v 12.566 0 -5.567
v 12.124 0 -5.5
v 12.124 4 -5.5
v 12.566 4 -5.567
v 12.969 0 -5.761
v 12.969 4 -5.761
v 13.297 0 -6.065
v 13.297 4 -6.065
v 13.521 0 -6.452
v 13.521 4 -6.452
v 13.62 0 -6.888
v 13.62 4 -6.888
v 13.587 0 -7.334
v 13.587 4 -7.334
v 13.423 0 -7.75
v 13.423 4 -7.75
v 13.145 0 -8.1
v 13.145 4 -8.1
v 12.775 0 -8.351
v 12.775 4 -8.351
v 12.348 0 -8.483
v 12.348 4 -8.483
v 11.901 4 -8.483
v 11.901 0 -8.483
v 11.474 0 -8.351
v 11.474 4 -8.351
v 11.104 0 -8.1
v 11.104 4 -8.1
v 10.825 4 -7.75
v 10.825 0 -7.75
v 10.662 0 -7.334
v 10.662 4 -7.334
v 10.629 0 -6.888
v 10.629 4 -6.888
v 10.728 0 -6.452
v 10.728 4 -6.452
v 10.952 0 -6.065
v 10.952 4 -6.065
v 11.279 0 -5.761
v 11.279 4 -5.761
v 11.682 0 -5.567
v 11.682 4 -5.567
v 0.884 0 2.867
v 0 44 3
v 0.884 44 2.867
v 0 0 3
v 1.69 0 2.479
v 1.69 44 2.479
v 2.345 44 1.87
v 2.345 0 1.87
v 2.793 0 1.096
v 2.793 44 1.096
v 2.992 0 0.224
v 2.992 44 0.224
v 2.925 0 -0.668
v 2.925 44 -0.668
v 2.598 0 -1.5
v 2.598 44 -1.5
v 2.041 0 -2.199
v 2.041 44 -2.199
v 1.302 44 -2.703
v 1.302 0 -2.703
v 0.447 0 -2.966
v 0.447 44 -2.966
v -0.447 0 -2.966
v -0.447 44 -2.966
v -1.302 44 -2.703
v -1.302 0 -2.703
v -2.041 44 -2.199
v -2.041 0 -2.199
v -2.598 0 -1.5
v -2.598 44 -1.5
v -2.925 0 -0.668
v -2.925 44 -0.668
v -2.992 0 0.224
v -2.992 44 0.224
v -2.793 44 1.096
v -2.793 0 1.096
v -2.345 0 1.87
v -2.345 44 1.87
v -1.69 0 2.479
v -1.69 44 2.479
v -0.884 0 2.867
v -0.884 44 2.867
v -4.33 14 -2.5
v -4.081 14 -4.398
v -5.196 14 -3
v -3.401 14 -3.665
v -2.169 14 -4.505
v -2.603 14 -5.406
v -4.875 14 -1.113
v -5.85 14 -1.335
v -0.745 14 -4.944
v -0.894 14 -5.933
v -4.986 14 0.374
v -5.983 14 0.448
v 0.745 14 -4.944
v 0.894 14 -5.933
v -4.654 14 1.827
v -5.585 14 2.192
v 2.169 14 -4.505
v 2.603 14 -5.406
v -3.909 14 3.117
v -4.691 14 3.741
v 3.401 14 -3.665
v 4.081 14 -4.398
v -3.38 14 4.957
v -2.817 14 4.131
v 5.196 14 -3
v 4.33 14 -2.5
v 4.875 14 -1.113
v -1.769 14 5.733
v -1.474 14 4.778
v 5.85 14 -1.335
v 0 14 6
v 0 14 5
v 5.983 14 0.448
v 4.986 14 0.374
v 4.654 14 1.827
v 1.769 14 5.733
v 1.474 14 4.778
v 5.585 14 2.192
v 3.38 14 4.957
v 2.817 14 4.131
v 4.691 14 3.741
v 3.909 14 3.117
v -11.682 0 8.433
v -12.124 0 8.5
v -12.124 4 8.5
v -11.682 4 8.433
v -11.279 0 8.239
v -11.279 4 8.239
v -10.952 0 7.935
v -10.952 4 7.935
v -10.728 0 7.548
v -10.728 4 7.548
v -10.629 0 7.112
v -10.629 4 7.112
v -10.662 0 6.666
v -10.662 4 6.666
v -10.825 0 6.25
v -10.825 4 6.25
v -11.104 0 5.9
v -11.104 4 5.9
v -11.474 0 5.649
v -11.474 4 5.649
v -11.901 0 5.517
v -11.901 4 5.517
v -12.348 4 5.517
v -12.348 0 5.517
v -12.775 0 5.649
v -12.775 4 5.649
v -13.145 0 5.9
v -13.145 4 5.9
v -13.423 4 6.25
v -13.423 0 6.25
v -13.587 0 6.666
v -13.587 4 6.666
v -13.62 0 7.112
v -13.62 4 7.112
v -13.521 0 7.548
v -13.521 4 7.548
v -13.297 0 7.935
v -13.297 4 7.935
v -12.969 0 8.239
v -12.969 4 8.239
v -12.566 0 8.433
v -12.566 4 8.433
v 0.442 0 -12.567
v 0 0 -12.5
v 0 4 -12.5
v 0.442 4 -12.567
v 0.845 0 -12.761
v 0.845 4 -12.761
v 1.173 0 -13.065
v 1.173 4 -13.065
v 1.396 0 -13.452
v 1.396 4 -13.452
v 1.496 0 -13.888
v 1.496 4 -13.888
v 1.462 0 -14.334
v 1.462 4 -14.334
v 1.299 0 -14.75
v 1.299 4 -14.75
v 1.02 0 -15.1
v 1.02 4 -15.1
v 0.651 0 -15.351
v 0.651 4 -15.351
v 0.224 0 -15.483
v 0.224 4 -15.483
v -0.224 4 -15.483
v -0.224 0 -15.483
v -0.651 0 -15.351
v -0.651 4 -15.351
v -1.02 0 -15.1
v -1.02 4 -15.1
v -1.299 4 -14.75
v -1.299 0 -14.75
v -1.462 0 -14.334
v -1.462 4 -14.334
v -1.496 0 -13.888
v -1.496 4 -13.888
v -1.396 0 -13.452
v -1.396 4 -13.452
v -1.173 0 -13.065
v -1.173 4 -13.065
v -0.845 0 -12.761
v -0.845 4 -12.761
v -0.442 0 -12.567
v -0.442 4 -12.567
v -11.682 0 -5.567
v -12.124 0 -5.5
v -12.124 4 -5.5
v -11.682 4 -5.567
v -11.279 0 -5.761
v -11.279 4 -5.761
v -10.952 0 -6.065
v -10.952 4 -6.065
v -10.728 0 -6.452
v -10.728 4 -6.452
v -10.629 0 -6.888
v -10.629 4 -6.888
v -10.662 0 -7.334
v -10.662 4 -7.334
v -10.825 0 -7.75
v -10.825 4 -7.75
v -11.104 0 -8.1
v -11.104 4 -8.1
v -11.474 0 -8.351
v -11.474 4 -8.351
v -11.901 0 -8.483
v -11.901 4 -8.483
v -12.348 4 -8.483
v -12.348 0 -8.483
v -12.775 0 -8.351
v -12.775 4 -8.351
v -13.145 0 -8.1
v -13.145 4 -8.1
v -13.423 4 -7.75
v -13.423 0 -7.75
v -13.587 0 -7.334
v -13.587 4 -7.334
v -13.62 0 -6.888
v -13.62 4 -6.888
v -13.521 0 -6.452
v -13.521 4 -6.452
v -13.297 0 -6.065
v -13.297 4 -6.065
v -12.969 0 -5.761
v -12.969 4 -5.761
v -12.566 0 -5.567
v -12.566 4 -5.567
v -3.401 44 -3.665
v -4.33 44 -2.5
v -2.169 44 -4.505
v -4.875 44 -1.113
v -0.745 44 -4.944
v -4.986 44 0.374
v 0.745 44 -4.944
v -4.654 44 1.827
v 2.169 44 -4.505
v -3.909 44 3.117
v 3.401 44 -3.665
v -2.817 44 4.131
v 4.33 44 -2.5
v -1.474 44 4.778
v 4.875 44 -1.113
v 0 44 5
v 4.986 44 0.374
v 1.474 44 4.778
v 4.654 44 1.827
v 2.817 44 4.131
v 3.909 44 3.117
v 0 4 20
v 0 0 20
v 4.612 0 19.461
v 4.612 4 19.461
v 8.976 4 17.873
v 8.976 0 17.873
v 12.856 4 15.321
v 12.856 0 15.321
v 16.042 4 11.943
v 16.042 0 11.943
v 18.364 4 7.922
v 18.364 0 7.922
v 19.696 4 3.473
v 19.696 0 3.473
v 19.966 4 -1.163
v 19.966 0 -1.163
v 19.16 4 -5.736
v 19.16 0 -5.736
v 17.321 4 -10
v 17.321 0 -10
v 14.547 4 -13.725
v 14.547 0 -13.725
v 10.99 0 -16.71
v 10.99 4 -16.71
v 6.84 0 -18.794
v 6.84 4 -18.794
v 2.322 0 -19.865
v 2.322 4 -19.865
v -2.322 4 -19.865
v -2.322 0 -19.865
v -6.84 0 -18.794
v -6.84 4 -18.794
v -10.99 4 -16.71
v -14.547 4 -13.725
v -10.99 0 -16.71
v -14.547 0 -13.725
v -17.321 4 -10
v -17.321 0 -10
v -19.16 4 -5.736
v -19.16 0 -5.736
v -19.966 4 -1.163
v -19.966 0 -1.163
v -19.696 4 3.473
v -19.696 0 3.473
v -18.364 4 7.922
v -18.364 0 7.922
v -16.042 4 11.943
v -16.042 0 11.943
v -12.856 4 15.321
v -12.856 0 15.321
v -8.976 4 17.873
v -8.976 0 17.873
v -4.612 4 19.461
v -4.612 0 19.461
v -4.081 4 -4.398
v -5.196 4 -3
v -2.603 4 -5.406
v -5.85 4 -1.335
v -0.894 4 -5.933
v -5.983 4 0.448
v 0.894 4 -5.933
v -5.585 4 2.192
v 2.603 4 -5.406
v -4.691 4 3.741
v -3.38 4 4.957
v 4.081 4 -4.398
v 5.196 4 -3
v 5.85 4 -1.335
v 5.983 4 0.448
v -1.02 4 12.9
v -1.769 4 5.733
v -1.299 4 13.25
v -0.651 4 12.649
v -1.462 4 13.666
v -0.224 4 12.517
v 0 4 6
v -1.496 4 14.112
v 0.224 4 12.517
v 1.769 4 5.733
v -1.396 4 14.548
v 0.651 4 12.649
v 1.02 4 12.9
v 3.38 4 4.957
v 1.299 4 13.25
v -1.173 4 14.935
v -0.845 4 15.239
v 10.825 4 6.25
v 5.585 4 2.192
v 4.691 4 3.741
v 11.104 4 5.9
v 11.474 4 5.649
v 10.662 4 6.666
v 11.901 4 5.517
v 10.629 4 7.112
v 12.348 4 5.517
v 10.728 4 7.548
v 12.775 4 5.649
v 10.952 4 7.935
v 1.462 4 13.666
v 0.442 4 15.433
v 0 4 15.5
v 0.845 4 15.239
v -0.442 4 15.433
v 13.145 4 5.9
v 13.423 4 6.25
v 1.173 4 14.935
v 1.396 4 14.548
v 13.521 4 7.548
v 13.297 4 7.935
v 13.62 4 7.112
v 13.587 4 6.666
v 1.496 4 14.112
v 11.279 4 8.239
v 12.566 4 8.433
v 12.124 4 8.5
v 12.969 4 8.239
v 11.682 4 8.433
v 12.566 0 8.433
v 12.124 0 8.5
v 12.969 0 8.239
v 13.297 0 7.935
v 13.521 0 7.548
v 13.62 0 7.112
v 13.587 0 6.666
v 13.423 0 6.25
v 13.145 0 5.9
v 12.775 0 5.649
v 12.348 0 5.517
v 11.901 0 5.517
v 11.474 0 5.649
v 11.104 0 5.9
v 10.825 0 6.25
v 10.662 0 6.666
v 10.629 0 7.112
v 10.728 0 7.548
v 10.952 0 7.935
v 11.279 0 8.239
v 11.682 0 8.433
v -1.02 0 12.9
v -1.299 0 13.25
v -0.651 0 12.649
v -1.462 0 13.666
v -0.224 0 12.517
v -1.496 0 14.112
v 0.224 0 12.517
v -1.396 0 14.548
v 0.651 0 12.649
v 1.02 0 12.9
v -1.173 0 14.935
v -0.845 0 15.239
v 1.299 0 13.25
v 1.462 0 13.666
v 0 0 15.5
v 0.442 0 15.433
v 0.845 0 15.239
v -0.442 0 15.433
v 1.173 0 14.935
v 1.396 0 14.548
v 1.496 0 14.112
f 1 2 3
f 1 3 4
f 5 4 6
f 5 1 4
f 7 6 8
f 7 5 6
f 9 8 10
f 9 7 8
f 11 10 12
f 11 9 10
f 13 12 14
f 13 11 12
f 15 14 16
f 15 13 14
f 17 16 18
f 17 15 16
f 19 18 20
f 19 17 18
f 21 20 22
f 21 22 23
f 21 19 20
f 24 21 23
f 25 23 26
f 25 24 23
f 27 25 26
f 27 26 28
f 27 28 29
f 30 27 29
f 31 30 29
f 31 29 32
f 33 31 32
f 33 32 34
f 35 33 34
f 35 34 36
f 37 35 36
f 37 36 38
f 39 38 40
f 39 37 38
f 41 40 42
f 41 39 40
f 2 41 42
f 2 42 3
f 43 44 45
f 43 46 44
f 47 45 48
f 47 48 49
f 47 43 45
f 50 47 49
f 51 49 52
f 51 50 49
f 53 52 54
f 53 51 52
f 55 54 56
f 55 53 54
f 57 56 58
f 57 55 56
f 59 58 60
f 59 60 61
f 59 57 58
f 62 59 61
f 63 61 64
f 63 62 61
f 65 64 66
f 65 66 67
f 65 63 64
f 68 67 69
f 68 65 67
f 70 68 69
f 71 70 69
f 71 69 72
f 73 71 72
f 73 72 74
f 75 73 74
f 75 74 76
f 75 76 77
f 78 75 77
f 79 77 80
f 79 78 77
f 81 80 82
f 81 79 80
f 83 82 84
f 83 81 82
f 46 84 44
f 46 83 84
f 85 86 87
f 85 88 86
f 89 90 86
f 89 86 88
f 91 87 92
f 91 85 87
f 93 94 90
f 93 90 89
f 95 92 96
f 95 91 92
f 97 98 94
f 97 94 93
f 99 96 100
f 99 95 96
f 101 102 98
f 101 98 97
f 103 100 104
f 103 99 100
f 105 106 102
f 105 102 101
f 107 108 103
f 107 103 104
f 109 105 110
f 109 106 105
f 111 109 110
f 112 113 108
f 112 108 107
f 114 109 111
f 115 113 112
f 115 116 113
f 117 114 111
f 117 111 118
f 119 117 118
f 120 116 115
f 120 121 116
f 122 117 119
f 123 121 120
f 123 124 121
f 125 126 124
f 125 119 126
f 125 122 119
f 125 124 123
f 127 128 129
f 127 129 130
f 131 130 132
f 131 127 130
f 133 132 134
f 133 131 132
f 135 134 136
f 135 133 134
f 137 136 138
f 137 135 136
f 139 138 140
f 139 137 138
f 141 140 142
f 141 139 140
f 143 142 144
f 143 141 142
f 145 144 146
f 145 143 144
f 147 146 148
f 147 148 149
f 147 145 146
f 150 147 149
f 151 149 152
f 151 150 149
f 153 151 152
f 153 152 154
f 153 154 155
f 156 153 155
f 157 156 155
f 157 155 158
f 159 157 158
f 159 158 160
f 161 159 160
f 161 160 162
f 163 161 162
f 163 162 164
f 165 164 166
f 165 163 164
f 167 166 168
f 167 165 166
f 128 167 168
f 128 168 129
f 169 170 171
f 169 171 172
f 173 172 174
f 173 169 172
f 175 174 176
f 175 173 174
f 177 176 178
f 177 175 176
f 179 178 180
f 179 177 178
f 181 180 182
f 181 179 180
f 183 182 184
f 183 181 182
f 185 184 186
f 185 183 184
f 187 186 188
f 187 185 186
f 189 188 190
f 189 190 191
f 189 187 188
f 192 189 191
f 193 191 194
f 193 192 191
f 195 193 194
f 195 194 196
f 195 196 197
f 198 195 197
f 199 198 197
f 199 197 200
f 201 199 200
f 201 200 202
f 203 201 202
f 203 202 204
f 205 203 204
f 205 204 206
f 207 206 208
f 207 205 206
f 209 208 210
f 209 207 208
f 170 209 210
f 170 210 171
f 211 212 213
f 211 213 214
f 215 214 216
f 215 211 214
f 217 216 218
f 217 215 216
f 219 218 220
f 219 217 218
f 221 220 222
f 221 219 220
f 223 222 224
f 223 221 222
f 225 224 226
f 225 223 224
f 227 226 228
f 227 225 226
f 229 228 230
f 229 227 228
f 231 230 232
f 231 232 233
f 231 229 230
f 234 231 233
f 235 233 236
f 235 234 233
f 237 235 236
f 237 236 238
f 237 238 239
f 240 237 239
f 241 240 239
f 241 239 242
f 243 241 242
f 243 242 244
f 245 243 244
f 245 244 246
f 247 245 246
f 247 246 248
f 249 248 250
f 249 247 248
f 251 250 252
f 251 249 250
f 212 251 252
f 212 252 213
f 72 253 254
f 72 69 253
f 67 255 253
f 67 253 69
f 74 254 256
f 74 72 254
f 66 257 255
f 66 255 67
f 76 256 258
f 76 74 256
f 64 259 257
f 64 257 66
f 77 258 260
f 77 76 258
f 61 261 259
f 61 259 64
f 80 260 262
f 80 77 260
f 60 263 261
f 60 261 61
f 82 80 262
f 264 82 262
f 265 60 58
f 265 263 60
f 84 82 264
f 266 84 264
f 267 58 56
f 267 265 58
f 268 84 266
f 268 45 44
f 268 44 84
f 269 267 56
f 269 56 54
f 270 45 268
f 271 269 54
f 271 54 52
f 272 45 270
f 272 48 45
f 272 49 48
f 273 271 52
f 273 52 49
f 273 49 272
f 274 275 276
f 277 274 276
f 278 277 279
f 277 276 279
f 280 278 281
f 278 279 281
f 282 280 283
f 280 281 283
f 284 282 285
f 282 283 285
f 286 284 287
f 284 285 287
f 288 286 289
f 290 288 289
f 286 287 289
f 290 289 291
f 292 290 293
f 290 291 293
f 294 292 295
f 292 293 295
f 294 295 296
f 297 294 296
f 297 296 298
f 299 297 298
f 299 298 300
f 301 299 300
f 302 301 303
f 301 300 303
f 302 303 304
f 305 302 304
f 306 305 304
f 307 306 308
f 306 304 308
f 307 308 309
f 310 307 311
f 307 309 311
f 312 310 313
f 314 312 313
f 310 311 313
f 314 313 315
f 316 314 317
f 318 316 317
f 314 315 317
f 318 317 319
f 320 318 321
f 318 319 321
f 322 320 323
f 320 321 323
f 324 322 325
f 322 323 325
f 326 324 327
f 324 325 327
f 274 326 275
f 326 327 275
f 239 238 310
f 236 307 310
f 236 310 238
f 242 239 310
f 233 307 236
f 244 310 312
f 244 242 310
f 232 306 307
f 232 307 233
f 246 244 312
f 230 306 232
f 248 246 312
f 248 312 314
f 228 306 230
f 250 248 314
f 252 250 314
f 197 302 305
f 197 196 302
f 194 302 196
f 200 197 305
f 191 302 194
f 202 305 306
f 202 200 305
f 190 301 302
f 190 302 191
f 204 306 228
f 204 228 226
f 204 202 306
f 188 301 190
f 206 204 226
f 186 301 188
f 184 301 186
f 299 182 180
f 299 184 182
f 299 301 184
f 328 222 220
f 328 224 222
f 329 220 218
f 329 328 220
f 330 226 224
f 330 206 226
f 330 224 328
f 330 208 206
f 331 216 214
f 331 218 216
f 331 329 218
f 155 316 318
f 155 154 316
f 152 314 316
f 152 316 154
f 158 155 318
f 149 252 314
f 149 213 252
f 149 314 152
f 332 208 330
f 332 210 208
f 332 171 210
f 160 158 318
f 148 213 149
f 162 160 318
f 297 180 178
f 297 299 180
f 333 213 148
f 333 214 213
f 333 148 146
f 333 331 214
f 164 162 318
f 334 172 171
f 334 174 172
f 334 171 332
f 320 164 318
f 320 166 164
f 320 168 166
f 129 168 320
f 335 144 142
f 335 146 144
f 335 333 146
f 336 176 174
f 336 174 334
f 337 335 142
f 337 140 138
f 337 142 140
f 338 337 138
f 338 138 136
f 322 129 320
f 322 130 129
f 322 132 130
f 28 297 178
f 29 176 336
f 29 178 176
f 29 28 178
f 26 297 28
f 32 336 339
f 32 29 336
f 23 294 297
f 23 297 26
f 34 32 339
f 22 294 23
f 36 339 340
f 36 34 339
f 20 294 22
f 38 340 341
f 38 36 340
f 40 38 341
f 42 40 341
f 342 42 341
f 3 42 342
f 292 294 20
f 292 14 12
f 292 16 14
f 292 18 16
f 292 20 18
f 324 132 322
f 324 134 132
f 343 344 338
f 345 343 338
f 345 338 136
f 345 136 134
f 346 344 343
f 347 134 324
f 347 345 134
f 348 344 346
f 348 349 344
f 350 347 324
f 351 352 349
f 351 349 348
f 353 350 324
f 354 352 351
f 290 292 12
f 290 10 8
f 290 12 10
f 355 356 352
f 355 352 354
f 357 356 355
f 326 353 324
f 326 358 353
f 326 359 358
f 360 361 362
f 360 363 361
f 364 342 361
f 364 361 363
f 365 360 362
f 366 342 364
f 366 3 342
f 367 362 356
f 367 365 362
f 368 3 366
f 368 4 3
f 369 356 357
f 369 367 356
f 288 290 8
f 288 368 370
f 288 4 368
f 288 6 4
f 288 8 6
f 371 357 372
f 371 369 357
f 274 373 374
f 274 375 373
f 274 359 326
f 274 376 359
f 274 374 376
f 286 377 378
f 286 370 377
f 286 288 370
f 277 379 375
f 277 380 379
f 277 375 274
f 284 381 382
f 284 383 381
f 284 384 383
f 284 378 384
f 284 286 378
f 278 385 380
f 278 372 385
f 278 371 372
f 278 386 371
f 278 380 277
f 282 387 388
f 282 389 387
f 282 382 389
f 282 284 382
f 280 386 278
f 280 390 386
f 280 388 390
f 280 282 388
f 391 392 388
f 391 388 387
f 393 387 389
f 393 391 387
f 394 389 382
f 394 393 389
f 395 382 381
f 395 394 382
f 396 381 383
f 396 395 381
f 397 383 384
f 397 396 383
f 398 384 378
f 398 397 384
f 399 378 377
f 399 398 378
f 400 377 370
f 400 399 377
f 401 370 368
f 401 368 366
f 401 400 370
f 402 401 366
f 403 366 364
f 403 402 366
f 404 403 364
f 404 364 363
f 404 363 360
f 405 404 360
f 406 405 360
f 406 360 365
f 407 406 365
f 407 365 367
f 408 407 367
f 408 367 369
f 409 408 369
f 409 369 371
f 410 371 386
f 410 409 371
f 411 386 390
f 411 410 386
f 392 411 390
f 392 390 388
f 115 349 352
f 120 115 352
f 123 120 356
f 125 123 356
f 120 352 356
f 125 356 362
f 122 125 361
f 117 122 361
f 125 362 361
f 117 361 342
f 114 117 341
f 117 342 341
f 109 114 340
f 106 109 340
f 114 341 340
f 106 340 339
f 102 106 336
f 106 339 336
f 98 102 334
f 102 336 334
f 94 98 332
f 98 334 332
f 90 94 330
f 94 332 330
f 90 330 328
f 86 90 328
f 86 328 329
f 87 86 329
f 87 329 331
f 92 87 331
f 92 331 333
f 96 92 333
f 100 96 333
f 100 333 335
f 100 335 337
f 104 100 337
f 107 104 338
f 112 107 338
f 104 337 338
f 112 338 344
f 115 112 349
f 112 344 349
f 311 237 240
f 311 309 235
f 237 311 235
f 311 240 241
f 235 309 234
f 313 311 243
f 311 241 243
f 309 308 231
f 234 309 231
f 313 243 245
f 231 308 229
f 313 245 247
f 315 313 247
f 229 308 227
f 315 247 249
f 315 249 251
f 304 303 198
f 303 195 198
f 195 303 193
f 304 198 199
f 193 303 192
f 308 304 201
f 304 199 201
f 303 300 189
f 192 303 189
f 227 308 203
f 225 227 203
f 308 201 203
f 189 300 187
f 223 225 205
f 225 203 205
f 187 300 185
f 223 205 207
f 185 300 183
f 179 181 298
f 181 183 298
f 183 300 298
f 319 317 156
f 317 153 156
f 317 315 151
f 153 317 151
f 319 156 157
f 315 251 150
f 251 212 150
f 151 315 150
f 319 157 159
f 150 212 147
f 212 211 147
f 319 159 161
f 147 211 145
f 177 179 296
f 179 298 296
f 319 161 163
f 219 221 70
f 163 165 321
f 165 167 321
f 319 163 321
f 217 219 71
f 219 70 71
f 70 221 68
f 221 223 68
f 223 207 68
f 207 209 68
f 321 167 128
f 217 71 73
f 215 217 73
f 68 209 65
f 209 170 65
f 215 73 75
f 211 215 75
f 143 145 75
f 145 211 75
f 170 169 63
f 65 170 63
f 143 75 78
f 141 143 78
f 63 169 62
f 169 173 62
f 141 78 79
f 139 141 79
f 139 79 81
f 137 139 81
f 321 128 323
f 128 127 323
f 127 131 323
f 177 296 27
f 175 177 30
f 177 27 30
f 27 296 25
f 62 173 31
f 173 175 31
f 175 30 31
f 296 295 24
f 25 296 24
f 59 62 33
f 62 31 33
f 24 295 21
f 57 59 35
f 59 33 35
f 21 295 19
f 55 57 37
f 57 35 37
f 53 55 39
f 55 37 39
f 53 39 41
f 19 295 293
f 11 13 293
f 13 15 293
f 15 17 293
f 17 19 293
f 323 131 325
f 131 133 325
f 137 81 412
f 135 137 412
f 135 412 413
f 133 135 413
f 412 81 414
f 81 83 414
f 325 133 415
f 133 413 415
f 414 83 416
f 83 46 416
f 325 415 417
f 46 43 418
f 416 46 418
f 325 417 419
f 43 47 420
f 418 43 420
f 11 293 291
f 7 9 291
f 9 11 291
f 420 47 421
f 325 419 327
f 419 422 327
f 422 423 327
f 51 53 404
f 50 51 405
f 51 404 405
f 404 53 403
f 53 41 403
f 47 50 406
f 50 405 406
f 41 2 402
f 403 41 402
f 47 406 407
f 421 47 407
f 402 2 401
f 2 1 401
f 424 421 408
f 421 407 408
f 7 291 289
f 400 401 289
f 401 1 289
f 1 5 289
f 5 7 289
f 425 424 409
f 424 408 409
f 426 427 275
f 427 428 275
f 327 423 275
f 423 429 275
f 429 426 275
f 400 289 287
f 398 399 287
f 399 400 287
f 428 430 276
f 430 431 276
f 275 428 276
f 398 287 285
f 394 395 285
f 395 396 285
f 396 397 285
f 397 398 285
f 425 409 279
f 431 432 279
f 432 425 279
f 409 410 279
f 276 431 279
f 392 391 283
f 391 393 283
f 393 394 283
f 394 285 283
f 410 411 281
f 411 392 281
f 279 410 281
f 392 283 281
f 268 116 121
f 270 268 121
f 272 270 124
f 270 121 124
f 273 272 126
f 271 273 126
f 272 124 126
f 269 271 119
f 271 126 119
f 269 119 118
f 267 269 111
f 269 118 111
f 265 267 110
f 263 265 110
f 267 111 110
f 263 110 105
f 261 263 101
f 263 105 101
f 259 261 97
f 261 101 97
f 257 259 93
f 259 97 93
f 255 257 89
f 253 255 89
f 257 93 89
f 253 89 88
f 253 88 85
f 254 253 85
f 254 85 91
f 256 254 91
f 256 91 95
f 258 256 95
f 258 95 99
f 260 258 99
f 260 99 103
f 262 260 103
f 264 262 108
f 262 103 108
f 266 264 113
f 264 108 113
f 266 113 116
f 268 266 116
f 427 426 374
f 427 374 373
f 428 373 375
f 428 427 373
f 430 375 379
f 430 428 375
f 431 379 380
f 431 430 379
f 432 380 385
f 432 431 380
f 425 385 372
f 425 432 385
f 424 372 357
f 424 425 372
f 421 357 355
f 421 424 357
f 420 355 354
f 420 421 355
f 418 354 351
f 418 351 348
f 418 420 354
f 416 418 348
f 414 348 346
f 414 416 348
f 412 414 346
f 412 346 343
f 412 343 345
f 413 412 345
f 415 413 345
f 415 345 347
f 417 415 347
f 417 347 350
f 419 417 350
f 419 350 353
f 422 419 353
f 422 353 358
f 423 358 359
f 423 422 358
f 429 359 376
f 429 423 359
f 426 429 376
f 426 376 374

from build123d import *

# Parameters (mm, degrees)
SKETCH_1_R      = 20
SKETCH_1_R_2    = 1.5
SKETCH_1_R_3    = 3
EXTRUDE_1_DEPTH = 4
SKETCH_2_R      = 6
SKETCH_2_R_2    = 3
EXTRUDE_2_DEPTH = 10
SKETCH_3_R      = 5
SKETCH_3_R_2    = 3
EXTRUDE_3_DEPTH = 30


with BuildPart() as part:
    # 草图1 → 凸台-拉伸1 (new body)
    with BuildSketch(Plane(origin=(0, 0, 0), x_dir=(1, 0, 0), z_dir=(0, 1, 0))):
        Circle(SKETCH_1_R)
        with Locations((0, 14)):
            Circle(SKETCH_1_R_2, mode=Mode.SUBTRACT)
        with Locations((12.124355653, 7)):
            Circle(SKETCH_1_R_2, mode=Mode.SUBTRACT)
        with Locations((12.124355653, -7)):
            Circle(SKETCH_1_R_2, mode=Mode.SUBTRACT)
        with Locations((0, -14)):
            Circle(SKETCH_1_R_2, mode=Mode.SUBTRACT)
        with Locations((-12.124355653, -7)):
            Circle(SKETCH_1_R_2, mode=Mode.SUBTRACT)
        with Locations((-12.124355653, 7)):
            Circle(SKETCH_1_R_2, mode=Mode.SUBTRACT)
        Circle(SKETCH_1_R_3, mode=Mode.SUBTRACT)
    extrude(amount=EXTRUDE_1_DEPTH)

    # 草图2 → 凸台-拉伸2 (add)
    with BuildSketch(Plane(origin=(0, 4, 0), x_dir=(1, 0, 0), z_dir=(0, 1, 0))):
        Circle(SKETCH_2_R)
        Circle(SKETCH_2_R_2, mode=Mode.SUBTRACT)
    extrude(amount=EXTRUDE_2_DEPTH)

    # 草图3 → 凸台-拉伸3 (add)
    with BuildSketch(Plane(origin=(0, 14, 0), x_dir=(1, 0, 0), z_dir=(0, 1, 0))):
        Circle(SKETCH_3_R)
        Circle(SKETCH_3_R_2, mode=Mode.SUBTRACT)
    extrude(amount=EXTRUDE_3_DEPTH)


solid = part.part
